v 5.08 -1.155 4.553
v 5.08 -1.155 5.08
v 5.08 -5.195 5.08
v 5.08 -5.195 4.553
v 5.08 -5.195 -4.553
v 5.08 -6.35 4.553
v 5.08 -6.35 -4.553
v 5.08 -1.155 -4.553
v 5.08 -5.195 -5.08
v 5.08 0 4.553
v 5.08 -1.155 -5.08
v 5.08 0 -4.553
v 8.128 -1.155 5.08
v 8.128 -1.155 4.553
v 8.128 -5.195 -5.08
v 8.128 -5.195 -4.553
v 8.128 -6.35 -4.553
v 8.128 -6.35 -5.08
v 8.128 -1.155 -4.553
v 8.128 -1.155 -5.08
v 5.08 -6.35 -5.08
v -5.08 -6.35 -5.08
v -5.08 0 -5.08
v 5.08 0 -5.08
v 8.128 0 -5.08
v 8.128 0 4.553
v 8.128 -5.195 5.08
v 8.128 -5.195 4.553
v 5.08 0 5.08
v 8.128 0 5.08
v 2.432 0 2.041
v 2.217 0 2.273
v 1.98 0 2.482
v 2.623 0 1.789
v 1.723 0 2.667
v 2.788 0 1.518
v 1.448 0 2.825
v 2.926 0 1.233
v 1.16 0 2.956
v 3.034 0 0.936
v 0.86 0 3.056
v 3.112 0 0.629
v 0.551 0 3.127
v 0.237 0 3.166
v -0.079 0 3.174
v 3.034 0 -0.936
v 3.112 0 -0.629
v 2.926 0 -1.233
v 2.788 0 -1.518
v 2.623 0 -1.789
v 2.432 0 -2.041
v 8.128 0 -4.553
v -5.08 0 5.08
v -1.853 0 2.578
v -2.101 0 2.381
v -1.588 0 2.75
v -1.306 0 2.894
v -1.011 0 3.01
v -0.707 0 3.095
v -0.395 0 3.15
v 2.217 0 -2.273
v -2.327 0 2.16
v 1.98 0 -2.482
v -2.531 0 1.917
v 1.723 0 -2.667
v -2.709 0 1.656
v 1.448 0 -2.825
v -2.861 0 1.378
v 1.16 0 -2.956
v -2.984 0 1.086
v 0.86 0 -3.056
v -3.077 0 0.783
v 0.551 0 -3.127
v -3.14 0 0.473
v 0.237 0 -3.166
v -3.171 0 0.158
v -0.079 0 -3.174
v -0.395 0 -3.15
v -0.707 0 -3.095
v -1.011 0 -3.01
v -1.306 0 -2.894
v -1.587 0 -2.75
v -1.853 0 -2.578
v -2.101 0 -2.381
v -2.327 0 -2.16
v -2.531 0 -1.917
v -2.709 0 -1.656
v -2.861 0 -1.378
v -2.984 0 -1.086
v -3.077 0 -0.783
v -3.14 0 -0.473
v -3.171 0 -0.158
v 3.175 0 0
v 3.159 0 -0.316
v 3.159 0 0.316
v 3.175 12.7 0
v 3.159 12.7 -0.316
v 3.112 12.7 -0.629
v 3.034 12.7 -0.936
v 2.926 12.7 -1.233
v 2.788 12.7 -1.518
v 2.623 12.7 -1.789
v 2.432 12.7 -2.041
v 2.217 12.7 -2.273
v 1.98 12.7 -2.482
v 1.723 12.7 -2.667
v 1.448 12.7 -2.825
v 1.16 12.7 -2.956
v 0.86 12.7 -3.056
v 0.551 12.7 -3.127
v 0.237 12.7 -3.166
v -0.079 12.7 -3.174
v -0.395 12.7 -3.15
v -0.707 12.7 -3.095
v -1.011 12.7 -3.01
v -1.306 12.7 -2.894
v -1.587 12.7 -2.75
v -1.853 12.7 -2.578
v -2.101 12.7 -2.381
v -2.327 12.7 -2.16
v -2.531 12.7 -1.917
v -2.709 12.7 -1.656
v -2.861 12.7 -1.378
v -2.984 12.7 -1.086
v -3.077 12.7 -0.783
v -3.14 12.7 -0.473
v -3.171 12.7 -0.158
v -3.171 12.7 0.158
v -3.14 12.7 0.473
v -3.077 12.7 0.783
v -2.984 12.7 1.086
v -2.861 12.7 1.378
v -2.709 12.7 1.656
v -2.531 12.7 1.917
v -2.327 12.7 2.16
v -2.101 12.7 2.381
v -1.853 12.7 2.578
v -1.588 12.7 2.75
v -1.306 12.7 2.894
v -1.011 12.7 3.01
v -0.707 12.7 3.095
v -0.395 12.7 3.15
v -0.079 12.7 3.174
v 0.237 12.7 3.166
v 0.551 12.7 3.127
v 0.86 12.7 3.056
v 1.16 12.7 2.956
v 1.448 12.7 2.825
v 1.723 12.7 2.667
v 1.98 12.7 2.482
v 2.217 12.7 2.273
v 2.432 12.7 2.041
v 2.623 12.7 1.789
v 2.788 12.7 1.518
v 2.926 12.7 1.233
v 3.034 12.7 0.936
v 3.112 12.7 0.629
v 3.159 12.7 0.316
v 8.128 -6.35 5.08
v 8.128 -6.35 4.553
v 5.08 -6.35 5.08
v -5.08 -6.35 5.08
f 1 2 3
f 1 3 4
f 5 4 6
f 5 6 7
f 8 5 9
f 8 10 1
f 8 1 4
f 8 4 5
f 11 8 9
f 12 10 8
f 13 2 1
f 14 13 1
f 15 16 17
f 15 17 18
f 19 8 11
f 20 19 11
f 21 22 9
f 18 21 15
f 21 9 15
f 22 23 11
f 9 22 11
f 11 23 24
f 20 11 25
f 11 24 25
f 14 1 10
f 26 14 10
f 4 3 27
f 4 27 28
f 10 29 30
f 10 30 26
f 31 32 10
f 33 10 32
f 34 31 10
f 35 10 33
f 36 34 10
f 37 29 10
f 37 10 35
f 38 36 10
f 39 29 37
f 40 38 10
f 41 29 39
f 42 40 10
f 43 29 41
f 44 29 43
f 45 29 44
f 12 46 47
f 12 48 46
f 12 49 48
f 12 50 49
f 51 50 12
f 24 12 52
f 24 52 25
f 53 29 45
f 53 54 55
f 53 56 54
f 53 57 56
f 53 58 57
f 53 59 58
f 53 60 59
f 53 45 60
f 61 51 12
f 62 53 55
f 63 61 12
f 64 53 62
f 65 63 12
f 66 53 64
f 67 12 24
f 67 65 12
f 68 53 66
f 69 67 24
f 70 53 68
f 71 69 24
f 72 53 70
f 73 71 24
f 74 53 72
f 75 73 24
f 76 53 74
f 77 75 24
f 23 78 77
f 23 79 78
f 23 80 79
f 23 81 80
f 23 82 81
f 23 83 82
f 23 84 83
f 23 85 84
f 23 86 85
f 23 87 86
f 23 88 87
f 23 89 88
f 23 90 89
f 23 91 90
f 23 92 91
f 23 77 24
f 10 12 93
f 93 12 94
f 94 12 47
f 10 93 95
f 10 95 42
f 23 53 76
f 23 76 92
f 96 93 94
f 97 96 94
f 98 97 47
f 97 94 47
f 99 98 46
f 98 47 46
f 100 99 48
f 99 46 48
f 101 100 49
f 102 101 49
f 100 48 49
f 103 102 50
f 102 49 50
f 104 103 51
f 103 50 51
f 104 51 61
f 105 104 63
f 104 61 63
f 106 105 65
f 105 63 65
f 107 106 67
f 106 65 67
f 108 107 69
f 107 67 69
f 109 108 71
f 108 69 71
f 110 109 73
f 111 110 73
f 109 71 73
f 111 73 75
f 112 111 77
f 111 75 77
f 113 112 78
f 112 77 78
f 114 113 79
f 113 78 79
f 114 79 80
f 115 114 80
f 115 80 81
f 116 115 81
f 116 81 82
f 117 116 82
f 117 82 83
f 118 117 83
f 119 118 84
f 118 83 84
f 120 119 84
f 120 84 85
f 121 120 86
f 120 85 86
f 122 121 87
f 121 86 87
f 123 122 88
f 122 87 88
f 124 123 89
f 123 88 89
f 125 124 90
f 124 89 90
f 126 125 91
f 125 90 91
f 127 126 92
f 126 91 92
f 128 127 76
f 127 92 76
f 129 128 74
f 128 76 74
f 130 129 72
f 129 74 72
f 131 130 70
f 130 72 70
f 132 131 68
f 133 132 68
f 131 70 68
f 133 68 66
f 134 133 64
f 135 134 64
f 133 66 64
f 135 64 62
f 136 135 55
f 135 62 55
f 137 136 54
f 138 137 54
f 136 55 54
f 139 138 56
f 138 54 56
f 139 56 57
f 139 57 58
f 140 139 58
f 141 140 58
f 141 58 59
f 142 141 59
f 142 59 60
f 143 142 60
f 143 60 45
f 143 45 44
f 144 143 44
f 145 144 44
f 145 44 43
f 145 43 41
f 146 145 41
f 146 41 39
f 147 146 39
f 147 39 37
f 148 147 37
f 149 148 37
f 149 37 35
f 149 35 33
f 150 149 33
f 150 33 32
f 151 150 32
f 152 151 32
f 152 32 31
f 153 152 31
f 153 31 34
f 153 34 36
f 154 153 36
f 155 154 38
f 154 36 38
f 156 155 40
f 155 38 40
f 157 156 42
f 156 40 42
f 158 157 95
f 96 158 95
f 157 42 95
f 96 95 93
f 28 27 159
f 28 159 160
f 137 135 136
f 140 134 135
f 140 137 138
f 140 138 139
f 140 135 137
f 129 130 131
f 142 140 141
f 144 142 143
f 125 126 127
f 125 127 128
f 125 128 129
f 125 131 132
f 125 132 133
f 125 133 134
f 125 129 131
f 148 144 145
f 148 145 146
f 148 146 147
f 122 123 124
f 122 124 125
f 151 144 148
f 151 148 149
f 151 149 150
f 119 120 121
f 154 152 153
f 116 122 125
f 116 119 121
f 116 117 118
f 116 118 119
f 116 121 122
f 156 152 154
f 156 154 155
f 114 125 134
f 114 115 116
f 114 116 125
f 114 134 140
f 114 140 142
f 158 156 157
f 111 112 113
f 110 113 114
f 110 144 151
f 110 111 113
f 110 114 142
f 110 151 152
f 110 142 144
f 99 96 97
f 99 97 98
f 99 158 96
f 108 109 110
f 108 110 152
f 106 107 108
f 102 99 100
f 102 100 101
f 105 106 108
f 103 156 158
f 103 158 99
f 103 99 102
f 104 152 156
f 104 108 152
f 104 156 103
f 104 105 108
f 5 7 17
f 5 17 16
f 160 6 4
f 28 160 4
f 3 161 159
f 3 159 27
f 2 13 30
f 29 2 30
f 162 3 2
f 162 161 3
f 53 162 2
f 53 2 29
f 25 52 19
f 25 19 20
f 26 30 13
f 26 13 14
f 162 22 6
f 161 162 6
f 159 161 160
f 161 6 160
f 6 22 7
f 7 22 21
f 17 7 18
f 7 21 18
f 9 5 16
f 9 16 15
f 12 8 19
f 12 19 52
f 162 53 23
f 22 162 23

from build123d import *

# Parameters (mm, degrees)
SKETCH1_R           = 3.175
BOSS_EXTRUDE1_DEPTH = 12.7
SKETCH1_3_W         = 10.16
SKETCH1_3_H         = 10.16
BOSS_EXTRUDE2_DEPTH = 6.35
SKETCH2_W           = 0.527405638
SKETCH2_H           = 1.155182197
BOSS_EXTRUDE3_DEPTH = 3.048


with BuildPart() as part:
    # Sketch1 → Boss-Extrude1 (new body)
    with BuildSketch(Plane(origin=(0, 0, 0), x_dir=(1, 0, 0), z_dir=(0, 1, 0))):
        Circle(SKETCH1_R)
    extrude(amount=BOSS_EXTRUDE1_DEPTH)

    # Sketch1<3> → Boss-Extrude2 (add)
    with BuildSketch(Plane(origin=(0, 0, 0), x_dir=(1, 0, 0), z_dir=(0, 1, 0))):
        Rectangle(SKETCH1_3_W, SKETCH1_3_H)
    extrude(amount=-BOSS_EXTRUDE2_DEPTH)

    # Sketch2 → Boss-Extrude3 (add)
    with BuildSketch(Plane(origin=(5.08, 0, 0), x_dir=(0, 0, -1), z_dir=(1, 0, 0))):
        with Locations((-4.816297181, -0.577591099)):
            Rectangle(SKETCH2_W, SKETCH2_H)
        with Locations((4.816297181, -0.577591099)):
            Rectangle(SKETCH2_W, SKETCH2_H)
        with Locations((4.816297181, -5.772408902)):
            Rectangle(SKETCH2_W, SKETCH2_H)
        with Locations((-4.816297181, -5.772408902)):
            Rectangle(SKETCH2_W, SKETCH2_H)
    extrude(amount=BOSS_EXTRUDE3_DEPTH)


solid = part.part
